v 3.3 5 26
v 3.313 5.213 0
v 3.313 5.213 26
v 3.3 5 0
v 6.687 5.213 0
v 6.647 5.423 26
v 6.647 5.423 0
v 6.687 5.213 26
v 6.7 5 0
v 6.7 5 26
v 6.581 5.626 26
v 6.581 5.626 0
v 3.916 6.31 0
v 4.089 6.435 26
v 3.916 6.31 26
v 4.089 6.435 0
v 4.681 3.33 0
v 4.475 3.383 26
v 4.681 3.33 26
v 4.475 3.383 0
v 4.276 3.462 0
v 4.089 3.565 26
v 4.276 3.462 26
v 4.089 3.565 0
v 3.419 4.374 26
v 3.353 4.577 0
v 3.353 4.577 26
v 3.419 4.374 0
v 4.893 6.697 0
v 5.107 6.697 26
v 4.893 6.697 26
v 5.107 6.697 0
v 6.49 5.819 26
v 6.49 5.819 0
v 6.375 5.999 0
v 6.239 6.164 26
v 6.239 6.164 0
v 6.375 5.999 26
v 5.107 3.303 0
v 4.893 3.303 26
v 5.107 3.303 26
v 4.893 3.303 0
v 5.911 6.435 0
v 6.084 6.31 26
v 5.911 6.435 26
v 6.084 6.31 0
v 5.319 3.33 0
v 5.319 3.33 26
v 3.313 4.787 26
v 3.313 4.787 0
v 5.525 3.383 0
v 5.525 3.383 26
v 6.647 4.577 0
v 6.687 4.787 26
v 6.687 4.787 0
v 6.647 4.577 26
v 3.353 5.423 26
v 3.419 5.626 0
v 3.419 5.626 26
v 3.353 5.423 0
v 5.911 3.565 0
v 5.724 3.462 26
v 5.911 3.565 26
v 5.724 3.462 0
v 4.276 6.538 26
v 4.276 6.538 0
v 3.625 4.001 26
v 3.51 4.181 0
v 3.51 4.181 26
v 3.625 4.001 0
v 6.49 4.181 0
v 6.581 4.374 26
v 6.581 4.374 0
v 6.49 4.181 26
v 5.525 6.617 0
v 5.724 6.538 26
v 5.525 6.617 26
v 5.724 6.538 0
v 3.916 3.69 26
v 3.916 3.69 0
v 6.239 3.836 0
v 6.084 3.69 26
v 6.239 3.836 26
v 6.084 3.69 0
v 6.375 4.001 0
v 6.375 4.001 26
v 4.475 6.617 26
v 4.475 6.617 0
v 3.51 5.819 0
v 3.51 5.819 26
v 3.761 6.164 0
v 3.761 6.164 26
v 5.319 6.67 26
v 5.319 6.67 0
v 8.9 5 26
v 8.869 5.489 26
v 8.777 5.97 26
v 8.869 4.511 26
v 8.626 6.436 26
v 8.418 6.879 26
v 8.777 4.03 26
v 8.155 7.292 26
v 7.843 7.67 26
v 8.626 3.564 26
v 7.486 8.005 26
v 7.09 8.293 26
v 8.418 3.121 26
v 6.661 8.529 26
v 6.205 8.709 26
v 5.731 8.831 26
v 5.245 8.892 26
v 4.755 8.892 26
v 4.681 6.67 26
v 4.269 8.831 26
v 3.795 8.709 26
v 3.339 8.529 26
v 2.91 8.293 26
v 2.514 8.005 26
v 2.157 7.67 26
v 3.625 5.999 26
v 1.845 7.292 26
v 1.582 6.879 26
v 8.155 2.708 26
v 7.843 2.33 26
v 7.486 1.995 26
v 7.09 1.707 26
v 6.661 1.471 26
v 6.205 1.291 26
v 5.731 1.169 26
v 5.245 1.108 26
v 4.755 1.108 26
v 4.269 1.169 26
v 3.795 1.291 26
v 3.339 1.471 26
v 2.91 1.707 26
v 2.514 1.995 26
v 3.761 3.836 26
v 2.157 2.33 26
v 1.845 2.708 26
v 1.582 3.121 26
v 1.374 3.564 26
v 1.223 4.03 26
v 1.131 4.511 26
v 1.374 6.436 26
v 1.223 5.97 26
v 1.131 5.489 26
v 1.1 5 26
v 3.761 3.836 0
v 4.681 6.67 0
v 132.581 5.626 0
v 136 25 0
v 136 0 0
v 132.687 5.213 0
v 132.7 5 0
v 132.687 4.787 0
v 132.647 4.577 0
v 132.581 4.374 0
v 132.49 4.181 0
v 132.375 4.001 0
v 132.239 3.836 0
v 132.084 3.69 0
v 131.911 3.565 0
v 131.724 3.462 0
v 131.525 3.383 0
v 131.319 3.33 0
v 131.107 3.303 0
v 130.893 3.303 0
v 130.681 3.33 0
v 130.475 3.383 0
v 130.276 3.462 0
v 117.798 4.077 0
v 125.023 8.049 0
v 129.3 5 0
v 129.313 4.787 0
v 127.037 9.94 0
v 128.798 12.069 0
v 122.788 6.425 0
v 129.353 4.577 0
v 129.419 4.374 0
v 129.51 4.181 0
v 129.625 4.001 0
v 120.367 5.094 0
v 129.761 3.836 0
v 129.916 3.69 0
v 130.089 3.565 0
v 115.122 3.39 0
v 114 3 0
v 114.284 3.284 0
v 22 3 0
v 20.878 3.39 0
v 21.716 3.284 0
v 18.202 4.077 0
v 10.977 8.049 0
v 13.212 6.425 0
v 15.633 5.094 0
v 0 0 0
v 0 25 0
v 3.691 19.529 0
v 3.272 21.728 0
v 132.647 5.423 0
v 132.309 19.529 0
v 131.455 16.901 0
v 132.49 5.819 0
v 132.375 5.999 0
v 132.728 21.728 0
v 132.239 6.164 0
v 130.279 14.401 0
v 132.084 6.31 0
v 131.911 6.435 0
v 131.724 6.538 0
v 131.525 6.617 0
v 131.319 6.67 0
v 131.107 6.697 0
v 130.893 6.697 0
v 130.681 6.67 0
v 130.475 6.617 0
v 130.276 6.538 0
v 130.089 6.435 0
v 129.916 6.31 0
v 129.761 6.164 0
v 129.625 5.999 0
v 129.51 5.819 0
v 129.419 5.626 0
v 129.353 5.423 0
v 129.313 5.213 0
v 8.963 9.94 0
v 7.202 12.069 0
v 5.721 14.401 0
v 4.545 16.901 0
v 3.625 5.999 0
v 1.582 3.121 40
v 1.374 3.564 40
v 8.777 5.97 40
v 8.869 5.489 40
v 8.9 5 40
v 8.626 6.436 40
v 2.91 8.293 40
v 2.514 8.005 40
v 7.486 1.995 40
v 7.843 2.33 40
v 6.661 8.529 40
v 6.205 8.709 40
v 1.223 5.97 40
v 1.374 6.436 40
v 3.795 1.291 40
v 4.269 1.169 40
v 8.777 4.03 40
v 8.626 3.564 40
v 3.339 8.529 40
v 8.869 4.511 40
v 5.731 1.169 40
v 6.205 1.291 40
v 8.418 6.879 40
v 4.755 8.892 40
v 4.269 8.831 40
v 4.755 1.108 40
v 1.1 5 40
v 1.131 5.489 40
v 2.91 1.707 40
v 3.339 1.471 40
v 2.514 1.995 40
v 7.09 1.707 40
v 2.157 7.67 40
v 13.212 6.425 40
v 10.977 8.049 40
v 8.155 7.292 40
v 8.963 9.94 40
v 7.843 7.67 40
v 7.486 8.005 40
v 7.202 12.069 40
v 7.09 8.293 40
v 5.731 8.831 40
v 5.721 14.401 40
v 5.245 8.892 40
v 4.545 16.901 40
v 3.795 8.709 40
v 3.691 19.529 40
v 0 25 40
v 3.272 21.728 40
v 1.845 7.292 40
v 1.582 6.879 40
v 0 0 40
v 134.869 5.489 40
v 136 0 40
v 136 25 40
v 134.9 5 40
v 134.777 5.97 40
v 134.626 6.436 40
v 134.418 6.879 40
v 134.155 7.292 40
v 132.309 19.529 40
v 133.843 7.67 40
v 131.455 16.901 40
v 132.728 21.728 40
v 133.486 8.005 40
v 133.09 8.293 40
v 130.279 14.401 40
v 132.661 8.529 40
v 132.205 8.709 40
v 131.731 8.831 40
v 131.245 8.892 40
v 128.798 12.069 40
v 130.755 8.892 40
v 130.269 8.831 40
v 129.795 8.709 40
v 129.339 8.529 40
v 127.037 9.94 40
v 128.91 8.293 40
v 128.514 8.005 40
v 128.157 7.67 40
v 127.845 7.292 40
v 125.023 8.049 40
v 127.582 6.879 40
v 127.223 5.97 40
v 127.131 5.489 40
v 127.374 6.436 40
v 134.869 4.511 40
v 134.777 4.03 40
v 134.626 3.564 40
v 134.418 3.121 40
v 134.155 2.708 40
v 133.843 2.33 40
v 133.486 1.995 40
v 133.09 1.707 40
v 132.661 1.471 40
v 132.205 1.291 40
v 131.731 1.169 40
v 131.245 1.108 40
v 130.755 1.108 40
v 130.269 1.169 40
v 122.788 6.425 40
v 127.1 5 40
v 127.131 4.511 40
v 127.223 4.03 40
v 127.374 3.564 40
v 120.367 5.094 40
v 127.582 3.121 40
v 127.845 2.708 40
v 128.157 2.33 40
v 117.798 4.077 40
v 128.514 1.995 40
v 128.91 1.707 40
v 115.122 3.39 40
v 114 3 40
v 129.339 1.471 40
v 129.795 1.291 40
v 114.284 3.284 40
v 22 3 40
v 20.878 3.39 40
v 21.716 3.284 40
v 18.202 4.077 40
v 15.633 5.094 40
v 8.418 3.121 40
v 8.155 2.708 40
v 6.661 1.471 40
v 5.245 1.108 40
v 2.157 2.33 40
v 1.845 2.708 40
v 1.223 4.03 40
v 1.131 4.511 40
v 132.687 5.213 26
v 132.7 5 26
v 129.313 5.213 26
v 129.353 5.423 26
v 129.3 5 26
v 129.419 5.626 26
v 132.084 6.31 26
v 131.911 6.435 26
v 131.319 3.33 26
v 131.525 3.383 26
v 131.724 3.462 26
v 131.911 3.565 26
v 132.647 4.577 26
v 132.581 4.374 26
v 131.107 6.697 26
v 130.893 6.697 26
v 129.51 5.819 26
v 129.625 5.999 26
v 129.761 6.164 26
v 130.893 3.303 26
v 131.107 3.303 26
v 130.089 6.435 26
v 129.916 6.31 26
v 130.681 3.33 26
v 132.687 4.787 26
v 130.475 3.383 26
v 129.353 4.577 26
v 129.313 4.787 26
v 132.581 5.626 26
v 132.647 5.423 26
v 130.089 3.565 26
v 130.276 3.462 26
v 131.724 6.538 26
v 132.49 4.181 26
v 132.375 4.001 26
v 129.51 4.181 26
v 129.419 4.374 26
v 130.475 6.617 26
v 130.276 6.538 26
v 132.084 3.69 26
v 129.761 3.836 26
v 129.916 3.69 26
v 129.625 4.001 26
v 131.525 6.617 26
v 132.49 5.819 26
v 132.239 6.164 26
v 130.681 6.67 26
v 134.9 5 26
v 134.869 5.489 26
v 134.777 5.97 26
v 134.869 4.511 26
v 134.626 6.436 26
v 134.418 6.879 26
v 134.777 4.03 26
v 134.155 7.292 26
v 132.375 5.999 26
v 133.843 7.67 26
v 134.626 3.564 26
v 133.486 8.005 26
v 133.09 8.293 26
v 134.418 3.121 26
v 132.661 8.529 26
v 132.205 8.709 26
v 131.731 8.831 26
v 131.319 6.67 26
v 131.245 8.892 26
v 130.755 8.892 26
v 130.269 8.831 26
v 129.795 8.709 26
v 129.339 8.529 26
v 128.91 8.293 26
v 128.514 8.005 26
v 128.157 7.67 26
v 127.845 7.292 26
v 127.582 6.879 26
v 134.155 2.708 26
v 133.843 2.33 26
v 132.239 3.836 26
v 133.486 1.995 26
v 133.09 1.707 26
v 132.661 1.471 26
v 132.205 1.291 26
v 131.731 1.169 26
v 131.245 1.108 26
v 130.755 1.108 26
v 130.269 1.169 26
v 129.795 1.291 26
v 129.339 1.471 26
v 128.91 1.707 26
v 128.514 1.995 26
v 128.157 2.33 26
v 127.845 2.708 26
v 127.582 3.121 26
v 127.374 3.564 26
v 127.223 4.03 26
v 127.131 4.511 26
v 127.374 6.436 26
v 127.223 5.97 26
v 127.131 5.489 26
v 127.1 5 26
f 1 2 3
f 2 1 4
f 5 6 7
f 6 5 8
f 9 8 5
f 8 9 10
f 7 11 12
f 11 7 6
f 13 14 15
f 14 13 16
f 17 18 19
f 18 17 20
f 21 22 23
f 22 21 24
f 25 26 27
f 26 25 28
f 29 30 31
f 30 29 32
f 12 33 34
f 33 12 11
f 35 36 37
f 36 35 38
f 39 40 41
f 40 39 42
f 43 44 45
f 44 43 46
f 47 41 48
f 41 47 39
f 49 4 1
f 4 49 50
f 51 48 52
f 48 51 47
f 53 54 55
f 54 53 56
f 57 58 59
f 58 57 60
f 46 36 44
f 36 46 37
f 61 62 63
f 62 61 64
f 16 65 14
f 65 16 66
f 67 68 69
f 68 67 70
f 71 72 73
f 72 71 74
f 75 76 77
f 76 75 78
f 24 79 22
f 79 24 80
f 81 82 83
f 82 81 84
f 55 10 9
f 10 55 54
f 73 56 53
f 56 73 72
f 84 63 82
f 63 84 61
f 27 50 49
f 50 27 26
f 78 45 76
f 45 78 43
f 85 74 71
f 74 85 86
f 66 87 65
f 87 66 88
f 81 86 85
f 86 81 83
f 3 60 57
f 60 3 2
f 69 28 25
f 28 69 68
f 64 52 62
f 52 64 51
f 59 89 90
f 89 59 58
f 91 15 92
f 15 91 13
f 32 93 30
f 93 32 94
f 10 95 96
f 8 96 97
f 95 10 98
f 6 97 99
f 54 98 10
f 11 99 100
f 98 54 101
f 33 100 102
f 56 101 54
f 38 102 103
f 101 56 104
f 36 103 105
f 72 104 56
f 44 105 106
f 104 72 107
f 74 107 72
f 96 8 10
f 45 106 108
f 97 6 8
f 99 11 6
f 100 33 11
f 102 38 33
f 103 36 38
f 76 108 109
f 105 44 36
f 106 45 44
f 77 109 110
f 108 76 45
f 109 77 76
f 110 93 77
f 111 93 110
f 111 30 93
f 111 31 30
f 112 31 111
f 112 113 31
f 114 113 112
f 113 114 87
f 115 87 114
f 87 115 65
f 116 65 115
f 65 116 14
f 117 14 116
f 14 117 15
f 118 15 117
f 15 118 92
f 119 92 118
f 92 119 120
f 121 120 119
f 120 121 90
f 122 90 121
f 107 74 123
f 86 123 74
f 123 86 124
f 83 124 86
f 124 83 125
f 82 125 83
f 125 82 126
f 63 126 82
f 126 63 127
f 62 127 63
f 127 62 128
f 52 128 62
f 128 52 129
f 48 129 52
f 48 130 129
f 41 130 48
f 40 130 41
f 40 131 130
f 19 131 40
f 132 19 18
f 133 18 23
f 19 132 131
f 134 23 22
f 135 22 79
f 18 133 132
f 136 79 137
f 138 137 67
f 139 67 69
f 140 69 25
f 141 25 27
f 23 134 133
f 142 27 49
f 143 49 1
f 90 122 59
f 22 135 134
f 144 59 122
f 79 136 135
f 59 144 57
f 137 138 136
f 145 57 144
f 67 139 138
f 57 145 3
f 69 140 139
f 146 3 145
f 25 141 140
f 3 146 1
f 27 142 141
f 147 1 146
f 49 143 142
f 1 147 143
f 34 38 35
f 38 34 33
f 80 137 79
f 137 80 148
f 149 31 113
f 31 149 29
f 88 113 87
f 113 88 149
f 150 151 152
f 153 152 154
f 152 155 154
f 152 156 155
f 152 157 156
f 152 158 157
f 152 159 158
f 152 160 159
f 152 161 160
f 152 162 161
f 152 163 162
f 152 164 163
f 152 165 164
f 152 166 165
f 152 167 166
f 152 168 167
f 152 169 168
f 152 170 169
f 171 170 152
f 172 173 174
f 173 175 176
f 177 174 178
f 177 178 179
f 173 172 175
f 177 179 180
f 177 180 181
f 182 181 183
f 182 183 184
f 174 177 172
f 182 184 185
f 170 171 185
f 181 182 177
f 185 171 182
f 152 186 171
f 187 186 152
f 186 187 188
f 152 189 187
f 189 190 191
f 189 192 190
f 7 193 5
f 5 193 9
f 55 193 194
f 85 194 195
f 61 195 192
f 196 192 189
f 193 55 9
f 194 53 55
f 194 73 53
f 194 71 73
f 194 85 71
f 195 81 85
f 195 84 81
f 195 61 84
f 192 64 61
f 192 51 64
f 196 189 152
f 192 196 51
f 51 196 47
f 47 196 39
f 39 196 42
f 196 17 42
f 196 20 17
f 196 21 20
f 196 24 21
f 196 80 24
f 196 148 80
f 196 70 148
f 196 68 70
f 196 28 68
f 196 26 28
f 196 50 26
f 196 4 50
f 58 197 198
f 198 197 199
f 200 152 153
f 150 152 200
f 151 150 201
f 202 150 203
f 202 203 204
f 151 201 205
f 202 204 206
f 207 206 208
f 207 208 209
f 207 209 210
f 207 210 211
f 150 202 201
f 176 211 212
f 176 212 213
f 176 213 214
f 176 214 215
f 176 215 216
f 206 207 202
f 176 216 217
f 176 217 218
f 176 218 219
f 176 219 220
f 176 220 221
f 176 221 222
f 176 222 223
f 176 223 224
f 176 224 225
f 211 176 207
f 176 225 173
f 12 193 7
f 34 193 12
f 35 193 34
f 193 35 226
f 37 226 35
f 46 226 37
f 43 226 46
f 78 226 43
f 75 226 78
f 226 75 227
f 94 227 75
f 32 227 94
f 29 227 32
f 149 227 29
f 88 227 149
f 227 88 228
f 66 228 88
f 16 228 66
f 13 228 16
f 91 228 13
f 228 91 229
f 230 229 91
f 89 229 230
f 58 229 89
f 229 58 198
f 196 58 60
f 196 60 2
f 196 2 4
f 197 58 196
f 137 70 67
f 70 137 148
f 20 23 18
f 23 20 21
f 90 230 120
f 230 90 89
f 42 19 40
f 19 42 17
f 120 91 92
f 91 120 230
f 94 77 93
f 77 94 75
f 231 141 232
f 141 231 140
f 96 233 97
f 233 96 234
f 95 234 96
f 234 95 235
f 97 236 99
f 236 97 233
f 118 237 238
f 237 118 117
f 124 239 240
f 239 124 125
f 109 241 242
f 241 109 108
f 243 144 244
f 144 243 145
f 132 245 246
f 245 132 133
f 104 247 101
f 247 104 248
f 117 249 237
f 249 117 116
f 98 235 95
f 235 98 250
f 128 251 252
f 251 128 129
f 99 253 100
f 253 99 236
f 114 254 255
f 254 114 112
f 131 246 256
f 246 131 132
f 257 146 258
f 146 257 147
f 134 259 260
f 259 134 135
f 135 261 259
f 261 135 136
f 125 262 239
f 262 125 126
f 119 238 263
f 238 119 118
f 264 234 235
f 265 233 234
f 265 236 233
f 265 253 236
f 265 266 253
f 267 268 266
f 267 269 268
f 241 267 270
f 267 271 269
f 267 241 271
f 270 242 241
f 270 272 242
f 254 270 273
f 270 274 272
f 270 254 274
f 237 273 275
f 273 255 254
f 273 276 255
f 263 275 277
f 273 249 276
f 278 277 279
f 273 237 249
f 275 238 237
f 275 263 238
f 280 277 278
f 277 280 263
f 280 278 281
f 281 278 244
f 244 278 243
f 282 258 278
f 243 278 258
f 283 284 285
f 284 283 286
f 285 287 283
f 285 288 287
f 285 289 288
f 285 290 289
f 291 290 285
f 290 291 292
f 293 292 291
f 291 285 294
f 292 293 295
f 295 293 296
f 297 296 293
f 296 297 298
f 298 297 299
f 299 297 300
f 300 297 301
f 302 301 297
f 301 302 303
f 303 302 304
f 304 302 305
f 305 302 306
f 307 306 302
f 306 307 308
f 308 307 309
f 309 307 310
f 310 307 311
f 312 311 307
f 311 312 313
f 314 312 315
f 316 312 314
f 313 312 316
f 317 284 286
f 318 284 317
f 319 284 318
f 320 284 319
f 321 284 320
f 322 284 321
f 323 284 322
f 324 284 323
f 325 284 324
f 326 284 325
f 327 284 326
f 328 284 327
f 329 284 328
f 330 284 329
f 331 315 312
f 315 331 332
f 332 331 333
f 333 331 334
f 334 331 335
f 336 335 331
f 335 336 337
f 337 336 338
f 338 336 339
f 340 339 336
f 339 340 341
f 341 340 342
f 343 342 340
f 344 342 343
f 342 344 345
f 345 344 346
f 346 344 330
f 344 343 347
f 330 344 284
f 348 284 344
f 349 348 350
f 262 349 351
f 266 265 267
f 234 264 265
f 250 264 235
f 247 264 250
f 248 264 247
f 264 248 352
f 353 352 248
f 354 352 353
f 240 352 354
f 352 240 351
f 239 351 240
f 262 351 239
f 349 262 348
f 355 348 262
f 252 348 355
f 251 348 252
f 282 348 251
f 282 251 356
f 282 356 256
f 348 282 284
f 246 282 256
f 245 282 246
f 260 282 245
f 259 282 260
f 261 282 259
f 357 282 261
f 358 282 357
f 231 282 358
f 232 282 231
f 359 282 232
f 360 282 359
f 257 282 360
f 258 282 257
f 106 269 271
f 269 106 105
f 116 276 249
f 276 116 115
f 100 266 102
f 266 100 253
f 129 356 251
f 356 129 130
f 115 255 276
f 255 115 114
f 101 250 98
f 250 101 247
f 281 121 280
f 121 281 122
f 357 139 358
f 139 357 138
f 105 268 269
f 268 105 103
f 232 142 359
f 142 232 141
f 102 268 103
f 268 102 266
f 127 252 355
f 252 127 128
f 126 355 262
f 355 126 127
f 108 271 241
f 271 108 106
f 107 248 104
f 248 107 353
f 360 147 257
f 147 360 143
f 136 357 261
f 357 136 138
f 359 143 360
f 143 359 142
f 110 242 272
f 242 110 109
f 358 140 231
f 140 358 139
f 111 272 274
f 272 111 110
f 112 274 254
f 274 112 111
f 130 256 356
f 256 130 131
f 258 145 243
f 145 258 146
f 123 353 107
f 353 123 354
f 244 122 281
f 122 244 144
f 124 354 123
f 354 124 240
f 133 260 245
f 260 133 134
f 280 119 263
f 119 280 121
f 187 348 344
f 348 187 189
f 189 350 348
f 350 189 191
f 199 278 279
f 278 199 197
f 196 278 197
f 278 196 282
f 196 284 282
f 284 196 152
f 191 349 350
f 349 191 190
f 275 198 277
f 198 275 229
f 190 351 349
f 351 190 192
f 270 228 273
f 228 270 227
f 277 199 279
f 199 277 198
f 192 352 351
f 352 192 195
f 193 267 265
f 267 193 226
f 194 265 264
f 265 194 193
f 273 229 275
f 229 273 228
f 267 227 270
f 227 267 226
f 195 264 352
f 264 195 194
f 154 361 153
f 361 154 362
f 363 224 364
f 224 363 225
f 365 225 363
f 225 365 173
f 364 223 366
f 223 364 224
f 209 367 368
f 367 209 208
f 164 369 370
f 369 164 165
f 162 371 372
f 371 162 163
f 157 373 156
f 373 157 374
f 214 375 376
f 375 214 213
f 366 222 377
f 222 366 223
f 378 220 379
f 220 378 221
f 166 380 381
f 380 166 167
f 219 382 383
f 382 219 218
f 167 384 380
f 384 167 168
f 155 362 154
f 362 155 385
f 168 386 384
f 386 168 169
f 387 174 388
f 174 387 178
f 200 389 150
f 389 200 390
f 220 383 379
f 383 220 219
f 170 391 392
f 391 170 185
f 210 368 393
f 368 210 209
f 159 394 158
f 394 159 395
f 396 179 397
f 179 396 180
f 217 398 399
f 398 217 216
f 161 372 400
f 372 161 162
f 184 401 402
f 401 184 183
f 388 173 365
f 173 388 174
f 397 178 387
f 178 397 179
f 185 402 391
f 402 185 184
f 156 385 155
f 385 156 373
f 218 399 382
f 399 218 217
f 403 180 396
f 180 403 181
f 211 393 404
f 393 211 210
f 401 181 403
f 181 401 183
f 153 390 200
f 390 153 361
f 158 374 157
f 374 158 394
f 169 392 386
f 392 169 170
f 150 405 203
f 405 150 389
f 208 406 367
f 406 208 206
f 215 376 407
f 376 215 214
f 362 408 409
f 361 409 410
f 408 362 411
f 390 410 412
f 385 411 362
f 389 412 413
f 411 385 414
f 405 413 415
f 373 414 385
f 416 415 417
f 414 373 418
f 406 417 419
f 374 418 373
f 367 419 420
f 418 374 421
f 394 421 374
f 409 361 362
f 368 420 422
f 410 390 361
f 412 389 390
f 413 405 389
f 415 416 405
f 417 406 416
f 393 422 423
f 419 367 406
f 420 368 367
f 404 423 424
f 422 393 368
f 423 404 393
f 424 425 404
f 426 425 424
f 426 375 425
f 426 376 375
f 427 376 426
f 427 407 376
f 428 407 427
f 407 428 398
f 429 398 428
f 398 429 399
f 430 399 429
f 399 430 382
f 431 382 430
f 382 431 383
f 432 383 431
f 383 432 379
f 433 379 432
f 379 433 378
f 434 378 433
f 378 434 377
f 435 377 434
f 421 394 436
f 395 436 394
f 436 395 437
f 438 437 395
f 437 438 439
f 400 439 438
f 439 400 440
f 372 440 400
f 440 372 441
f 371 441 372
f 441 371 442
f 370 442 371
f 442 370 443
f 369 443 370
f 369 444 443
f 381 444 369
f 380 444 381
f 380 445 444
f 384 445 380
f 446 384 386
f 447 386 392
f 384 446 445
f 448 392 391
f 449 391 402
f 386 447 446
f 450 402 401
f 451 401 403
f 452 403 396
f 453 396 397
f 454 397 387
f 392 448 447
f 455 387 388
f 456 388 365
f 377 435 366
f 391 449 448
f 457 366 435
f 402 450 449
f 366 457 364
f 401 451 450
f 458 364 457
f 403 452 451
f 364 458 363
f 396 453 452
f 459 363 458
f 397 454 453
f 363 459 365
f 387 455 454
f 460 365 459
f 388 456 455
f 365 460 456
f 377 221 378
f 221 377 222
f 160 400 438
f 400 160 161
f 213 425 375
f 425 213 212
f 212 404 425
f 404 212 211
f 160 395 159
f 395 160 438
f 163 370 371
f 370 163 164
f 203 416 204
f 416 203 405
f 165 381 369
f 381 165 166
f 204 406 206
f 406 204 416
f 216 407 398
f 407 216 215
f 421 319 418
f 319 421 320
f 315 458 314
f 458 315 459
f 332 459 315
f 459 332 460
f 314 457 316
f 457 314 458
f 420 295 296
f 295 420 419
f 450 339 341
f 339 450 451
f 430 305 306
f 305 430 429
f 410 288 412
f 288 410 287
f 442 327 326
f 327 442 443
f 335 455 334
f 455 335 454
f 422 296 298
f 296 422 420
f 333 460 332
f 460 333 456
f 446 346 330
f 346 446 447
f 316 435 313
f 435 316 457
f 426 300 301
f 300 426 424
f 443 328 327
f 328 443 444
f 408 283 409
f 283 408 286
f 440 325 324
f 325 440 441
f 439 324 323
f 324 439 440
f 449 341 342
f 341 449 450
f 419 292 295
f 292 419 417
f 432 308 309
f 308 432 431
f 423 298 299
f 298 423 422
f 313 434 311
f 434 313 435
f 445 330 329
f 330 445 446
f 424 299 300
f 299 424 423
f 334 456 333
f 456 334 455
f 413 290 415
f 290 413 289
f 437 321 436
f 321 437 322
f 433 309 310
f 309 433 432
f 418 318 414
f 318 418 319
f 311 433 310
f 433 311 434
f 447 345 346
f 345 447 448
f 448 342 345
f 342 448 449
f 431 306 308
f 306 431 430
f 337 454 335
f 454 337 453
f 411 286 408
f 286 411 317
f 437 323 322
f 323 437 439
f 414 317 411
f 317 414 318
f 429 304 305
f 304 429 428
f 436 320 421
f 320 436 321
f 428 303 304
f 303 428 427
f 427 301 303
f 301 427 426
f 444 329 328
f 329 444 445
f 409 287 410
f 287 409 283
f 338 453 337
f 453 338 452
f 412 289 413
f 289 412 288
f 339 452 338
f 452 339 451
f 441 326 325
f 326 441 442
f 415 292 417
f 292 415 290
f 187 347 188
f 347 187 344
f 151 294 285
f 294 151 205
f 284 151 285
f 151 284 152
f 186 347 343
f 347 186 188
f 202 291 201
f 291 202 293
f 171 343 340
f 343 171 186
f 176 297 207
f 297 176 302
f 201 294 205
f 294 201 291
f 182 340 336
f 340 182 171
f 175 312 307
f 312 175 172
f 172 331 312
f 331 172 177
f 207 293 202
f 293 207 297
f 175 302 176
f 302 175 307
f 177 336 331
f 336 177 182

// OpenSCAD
$fn=50;

// length of the small wall piece facing the sides. Technically also the beginnings
// of the longer wall, but there it's swallowed by the wall anyway.
outside_wall_length=25;
// screw length without thread and head
// 26 works fine for the 30mm screws included with the radiator -
// assuming you used the 35mm screws for fan mounting.
screw_height=26;
// diameter with a bit of tolerance. 3.4 gives a nice fit for M3 screws
screw_diameter=3.4;
// 7.8 should be a good fit for M3 screws
screw_head_diameter=7.8;
// total height of this thing
leg_height=40;
// offset of the center of the screw hole from the sides of the leg
// 5 works well to have a slight rim around the head of a M3 screw
// while not overlapping with radiator finns
hole_offset=5;
// distance between the two mounting holes. 135-136 seems to be
// the right distance for 140mm fan mounts.
hole_distance=136;
// thickness of the wall connecting the two corners
wall_width=3;
// the radious of the round cutout of the side triangles. 22 pretty much matches
// the shroud of alphacool radiators
inner_cutout_r=22;

// this builds supports for one corner with a wall section to the
// middle of the radiator
module fan_corner_support(){
  difference(){
    linear_extrude(height=leg_height){
      polygon(points=[[0,0],[outside_wall_length,0],[0,outside_wall_length]], paths=[[0,1,2]],convexity=10);
      square(size=[hole_distance/2,wall_width], center=false);
    }
    translate([hole_offset, hole_offset, 0]){
      cylinder(r=screw_diameter/2,h=screw_height);
      translate([0,0,screw_height]){
        cylinder(r=screw_head_diameter/2,leg_height-screw_height);
      }
    }
    translate([outside_wall_length,outside_wall_length,0]){
      cylinder(r=inner_cutout_r,h=leg_height);
    }
  }
}

// this just mirrors and moves a second corner support, generating a full
// leg mountable on two corners with a thin wall, suitable for the legs
// left and right of the radiator
module fan_side_support(){
  fan_corner_support();

  translate([hole_distance,0,0]){
    mirror([1,0,0]){fan_corner_support();}
  }
}

fan_side_support();
